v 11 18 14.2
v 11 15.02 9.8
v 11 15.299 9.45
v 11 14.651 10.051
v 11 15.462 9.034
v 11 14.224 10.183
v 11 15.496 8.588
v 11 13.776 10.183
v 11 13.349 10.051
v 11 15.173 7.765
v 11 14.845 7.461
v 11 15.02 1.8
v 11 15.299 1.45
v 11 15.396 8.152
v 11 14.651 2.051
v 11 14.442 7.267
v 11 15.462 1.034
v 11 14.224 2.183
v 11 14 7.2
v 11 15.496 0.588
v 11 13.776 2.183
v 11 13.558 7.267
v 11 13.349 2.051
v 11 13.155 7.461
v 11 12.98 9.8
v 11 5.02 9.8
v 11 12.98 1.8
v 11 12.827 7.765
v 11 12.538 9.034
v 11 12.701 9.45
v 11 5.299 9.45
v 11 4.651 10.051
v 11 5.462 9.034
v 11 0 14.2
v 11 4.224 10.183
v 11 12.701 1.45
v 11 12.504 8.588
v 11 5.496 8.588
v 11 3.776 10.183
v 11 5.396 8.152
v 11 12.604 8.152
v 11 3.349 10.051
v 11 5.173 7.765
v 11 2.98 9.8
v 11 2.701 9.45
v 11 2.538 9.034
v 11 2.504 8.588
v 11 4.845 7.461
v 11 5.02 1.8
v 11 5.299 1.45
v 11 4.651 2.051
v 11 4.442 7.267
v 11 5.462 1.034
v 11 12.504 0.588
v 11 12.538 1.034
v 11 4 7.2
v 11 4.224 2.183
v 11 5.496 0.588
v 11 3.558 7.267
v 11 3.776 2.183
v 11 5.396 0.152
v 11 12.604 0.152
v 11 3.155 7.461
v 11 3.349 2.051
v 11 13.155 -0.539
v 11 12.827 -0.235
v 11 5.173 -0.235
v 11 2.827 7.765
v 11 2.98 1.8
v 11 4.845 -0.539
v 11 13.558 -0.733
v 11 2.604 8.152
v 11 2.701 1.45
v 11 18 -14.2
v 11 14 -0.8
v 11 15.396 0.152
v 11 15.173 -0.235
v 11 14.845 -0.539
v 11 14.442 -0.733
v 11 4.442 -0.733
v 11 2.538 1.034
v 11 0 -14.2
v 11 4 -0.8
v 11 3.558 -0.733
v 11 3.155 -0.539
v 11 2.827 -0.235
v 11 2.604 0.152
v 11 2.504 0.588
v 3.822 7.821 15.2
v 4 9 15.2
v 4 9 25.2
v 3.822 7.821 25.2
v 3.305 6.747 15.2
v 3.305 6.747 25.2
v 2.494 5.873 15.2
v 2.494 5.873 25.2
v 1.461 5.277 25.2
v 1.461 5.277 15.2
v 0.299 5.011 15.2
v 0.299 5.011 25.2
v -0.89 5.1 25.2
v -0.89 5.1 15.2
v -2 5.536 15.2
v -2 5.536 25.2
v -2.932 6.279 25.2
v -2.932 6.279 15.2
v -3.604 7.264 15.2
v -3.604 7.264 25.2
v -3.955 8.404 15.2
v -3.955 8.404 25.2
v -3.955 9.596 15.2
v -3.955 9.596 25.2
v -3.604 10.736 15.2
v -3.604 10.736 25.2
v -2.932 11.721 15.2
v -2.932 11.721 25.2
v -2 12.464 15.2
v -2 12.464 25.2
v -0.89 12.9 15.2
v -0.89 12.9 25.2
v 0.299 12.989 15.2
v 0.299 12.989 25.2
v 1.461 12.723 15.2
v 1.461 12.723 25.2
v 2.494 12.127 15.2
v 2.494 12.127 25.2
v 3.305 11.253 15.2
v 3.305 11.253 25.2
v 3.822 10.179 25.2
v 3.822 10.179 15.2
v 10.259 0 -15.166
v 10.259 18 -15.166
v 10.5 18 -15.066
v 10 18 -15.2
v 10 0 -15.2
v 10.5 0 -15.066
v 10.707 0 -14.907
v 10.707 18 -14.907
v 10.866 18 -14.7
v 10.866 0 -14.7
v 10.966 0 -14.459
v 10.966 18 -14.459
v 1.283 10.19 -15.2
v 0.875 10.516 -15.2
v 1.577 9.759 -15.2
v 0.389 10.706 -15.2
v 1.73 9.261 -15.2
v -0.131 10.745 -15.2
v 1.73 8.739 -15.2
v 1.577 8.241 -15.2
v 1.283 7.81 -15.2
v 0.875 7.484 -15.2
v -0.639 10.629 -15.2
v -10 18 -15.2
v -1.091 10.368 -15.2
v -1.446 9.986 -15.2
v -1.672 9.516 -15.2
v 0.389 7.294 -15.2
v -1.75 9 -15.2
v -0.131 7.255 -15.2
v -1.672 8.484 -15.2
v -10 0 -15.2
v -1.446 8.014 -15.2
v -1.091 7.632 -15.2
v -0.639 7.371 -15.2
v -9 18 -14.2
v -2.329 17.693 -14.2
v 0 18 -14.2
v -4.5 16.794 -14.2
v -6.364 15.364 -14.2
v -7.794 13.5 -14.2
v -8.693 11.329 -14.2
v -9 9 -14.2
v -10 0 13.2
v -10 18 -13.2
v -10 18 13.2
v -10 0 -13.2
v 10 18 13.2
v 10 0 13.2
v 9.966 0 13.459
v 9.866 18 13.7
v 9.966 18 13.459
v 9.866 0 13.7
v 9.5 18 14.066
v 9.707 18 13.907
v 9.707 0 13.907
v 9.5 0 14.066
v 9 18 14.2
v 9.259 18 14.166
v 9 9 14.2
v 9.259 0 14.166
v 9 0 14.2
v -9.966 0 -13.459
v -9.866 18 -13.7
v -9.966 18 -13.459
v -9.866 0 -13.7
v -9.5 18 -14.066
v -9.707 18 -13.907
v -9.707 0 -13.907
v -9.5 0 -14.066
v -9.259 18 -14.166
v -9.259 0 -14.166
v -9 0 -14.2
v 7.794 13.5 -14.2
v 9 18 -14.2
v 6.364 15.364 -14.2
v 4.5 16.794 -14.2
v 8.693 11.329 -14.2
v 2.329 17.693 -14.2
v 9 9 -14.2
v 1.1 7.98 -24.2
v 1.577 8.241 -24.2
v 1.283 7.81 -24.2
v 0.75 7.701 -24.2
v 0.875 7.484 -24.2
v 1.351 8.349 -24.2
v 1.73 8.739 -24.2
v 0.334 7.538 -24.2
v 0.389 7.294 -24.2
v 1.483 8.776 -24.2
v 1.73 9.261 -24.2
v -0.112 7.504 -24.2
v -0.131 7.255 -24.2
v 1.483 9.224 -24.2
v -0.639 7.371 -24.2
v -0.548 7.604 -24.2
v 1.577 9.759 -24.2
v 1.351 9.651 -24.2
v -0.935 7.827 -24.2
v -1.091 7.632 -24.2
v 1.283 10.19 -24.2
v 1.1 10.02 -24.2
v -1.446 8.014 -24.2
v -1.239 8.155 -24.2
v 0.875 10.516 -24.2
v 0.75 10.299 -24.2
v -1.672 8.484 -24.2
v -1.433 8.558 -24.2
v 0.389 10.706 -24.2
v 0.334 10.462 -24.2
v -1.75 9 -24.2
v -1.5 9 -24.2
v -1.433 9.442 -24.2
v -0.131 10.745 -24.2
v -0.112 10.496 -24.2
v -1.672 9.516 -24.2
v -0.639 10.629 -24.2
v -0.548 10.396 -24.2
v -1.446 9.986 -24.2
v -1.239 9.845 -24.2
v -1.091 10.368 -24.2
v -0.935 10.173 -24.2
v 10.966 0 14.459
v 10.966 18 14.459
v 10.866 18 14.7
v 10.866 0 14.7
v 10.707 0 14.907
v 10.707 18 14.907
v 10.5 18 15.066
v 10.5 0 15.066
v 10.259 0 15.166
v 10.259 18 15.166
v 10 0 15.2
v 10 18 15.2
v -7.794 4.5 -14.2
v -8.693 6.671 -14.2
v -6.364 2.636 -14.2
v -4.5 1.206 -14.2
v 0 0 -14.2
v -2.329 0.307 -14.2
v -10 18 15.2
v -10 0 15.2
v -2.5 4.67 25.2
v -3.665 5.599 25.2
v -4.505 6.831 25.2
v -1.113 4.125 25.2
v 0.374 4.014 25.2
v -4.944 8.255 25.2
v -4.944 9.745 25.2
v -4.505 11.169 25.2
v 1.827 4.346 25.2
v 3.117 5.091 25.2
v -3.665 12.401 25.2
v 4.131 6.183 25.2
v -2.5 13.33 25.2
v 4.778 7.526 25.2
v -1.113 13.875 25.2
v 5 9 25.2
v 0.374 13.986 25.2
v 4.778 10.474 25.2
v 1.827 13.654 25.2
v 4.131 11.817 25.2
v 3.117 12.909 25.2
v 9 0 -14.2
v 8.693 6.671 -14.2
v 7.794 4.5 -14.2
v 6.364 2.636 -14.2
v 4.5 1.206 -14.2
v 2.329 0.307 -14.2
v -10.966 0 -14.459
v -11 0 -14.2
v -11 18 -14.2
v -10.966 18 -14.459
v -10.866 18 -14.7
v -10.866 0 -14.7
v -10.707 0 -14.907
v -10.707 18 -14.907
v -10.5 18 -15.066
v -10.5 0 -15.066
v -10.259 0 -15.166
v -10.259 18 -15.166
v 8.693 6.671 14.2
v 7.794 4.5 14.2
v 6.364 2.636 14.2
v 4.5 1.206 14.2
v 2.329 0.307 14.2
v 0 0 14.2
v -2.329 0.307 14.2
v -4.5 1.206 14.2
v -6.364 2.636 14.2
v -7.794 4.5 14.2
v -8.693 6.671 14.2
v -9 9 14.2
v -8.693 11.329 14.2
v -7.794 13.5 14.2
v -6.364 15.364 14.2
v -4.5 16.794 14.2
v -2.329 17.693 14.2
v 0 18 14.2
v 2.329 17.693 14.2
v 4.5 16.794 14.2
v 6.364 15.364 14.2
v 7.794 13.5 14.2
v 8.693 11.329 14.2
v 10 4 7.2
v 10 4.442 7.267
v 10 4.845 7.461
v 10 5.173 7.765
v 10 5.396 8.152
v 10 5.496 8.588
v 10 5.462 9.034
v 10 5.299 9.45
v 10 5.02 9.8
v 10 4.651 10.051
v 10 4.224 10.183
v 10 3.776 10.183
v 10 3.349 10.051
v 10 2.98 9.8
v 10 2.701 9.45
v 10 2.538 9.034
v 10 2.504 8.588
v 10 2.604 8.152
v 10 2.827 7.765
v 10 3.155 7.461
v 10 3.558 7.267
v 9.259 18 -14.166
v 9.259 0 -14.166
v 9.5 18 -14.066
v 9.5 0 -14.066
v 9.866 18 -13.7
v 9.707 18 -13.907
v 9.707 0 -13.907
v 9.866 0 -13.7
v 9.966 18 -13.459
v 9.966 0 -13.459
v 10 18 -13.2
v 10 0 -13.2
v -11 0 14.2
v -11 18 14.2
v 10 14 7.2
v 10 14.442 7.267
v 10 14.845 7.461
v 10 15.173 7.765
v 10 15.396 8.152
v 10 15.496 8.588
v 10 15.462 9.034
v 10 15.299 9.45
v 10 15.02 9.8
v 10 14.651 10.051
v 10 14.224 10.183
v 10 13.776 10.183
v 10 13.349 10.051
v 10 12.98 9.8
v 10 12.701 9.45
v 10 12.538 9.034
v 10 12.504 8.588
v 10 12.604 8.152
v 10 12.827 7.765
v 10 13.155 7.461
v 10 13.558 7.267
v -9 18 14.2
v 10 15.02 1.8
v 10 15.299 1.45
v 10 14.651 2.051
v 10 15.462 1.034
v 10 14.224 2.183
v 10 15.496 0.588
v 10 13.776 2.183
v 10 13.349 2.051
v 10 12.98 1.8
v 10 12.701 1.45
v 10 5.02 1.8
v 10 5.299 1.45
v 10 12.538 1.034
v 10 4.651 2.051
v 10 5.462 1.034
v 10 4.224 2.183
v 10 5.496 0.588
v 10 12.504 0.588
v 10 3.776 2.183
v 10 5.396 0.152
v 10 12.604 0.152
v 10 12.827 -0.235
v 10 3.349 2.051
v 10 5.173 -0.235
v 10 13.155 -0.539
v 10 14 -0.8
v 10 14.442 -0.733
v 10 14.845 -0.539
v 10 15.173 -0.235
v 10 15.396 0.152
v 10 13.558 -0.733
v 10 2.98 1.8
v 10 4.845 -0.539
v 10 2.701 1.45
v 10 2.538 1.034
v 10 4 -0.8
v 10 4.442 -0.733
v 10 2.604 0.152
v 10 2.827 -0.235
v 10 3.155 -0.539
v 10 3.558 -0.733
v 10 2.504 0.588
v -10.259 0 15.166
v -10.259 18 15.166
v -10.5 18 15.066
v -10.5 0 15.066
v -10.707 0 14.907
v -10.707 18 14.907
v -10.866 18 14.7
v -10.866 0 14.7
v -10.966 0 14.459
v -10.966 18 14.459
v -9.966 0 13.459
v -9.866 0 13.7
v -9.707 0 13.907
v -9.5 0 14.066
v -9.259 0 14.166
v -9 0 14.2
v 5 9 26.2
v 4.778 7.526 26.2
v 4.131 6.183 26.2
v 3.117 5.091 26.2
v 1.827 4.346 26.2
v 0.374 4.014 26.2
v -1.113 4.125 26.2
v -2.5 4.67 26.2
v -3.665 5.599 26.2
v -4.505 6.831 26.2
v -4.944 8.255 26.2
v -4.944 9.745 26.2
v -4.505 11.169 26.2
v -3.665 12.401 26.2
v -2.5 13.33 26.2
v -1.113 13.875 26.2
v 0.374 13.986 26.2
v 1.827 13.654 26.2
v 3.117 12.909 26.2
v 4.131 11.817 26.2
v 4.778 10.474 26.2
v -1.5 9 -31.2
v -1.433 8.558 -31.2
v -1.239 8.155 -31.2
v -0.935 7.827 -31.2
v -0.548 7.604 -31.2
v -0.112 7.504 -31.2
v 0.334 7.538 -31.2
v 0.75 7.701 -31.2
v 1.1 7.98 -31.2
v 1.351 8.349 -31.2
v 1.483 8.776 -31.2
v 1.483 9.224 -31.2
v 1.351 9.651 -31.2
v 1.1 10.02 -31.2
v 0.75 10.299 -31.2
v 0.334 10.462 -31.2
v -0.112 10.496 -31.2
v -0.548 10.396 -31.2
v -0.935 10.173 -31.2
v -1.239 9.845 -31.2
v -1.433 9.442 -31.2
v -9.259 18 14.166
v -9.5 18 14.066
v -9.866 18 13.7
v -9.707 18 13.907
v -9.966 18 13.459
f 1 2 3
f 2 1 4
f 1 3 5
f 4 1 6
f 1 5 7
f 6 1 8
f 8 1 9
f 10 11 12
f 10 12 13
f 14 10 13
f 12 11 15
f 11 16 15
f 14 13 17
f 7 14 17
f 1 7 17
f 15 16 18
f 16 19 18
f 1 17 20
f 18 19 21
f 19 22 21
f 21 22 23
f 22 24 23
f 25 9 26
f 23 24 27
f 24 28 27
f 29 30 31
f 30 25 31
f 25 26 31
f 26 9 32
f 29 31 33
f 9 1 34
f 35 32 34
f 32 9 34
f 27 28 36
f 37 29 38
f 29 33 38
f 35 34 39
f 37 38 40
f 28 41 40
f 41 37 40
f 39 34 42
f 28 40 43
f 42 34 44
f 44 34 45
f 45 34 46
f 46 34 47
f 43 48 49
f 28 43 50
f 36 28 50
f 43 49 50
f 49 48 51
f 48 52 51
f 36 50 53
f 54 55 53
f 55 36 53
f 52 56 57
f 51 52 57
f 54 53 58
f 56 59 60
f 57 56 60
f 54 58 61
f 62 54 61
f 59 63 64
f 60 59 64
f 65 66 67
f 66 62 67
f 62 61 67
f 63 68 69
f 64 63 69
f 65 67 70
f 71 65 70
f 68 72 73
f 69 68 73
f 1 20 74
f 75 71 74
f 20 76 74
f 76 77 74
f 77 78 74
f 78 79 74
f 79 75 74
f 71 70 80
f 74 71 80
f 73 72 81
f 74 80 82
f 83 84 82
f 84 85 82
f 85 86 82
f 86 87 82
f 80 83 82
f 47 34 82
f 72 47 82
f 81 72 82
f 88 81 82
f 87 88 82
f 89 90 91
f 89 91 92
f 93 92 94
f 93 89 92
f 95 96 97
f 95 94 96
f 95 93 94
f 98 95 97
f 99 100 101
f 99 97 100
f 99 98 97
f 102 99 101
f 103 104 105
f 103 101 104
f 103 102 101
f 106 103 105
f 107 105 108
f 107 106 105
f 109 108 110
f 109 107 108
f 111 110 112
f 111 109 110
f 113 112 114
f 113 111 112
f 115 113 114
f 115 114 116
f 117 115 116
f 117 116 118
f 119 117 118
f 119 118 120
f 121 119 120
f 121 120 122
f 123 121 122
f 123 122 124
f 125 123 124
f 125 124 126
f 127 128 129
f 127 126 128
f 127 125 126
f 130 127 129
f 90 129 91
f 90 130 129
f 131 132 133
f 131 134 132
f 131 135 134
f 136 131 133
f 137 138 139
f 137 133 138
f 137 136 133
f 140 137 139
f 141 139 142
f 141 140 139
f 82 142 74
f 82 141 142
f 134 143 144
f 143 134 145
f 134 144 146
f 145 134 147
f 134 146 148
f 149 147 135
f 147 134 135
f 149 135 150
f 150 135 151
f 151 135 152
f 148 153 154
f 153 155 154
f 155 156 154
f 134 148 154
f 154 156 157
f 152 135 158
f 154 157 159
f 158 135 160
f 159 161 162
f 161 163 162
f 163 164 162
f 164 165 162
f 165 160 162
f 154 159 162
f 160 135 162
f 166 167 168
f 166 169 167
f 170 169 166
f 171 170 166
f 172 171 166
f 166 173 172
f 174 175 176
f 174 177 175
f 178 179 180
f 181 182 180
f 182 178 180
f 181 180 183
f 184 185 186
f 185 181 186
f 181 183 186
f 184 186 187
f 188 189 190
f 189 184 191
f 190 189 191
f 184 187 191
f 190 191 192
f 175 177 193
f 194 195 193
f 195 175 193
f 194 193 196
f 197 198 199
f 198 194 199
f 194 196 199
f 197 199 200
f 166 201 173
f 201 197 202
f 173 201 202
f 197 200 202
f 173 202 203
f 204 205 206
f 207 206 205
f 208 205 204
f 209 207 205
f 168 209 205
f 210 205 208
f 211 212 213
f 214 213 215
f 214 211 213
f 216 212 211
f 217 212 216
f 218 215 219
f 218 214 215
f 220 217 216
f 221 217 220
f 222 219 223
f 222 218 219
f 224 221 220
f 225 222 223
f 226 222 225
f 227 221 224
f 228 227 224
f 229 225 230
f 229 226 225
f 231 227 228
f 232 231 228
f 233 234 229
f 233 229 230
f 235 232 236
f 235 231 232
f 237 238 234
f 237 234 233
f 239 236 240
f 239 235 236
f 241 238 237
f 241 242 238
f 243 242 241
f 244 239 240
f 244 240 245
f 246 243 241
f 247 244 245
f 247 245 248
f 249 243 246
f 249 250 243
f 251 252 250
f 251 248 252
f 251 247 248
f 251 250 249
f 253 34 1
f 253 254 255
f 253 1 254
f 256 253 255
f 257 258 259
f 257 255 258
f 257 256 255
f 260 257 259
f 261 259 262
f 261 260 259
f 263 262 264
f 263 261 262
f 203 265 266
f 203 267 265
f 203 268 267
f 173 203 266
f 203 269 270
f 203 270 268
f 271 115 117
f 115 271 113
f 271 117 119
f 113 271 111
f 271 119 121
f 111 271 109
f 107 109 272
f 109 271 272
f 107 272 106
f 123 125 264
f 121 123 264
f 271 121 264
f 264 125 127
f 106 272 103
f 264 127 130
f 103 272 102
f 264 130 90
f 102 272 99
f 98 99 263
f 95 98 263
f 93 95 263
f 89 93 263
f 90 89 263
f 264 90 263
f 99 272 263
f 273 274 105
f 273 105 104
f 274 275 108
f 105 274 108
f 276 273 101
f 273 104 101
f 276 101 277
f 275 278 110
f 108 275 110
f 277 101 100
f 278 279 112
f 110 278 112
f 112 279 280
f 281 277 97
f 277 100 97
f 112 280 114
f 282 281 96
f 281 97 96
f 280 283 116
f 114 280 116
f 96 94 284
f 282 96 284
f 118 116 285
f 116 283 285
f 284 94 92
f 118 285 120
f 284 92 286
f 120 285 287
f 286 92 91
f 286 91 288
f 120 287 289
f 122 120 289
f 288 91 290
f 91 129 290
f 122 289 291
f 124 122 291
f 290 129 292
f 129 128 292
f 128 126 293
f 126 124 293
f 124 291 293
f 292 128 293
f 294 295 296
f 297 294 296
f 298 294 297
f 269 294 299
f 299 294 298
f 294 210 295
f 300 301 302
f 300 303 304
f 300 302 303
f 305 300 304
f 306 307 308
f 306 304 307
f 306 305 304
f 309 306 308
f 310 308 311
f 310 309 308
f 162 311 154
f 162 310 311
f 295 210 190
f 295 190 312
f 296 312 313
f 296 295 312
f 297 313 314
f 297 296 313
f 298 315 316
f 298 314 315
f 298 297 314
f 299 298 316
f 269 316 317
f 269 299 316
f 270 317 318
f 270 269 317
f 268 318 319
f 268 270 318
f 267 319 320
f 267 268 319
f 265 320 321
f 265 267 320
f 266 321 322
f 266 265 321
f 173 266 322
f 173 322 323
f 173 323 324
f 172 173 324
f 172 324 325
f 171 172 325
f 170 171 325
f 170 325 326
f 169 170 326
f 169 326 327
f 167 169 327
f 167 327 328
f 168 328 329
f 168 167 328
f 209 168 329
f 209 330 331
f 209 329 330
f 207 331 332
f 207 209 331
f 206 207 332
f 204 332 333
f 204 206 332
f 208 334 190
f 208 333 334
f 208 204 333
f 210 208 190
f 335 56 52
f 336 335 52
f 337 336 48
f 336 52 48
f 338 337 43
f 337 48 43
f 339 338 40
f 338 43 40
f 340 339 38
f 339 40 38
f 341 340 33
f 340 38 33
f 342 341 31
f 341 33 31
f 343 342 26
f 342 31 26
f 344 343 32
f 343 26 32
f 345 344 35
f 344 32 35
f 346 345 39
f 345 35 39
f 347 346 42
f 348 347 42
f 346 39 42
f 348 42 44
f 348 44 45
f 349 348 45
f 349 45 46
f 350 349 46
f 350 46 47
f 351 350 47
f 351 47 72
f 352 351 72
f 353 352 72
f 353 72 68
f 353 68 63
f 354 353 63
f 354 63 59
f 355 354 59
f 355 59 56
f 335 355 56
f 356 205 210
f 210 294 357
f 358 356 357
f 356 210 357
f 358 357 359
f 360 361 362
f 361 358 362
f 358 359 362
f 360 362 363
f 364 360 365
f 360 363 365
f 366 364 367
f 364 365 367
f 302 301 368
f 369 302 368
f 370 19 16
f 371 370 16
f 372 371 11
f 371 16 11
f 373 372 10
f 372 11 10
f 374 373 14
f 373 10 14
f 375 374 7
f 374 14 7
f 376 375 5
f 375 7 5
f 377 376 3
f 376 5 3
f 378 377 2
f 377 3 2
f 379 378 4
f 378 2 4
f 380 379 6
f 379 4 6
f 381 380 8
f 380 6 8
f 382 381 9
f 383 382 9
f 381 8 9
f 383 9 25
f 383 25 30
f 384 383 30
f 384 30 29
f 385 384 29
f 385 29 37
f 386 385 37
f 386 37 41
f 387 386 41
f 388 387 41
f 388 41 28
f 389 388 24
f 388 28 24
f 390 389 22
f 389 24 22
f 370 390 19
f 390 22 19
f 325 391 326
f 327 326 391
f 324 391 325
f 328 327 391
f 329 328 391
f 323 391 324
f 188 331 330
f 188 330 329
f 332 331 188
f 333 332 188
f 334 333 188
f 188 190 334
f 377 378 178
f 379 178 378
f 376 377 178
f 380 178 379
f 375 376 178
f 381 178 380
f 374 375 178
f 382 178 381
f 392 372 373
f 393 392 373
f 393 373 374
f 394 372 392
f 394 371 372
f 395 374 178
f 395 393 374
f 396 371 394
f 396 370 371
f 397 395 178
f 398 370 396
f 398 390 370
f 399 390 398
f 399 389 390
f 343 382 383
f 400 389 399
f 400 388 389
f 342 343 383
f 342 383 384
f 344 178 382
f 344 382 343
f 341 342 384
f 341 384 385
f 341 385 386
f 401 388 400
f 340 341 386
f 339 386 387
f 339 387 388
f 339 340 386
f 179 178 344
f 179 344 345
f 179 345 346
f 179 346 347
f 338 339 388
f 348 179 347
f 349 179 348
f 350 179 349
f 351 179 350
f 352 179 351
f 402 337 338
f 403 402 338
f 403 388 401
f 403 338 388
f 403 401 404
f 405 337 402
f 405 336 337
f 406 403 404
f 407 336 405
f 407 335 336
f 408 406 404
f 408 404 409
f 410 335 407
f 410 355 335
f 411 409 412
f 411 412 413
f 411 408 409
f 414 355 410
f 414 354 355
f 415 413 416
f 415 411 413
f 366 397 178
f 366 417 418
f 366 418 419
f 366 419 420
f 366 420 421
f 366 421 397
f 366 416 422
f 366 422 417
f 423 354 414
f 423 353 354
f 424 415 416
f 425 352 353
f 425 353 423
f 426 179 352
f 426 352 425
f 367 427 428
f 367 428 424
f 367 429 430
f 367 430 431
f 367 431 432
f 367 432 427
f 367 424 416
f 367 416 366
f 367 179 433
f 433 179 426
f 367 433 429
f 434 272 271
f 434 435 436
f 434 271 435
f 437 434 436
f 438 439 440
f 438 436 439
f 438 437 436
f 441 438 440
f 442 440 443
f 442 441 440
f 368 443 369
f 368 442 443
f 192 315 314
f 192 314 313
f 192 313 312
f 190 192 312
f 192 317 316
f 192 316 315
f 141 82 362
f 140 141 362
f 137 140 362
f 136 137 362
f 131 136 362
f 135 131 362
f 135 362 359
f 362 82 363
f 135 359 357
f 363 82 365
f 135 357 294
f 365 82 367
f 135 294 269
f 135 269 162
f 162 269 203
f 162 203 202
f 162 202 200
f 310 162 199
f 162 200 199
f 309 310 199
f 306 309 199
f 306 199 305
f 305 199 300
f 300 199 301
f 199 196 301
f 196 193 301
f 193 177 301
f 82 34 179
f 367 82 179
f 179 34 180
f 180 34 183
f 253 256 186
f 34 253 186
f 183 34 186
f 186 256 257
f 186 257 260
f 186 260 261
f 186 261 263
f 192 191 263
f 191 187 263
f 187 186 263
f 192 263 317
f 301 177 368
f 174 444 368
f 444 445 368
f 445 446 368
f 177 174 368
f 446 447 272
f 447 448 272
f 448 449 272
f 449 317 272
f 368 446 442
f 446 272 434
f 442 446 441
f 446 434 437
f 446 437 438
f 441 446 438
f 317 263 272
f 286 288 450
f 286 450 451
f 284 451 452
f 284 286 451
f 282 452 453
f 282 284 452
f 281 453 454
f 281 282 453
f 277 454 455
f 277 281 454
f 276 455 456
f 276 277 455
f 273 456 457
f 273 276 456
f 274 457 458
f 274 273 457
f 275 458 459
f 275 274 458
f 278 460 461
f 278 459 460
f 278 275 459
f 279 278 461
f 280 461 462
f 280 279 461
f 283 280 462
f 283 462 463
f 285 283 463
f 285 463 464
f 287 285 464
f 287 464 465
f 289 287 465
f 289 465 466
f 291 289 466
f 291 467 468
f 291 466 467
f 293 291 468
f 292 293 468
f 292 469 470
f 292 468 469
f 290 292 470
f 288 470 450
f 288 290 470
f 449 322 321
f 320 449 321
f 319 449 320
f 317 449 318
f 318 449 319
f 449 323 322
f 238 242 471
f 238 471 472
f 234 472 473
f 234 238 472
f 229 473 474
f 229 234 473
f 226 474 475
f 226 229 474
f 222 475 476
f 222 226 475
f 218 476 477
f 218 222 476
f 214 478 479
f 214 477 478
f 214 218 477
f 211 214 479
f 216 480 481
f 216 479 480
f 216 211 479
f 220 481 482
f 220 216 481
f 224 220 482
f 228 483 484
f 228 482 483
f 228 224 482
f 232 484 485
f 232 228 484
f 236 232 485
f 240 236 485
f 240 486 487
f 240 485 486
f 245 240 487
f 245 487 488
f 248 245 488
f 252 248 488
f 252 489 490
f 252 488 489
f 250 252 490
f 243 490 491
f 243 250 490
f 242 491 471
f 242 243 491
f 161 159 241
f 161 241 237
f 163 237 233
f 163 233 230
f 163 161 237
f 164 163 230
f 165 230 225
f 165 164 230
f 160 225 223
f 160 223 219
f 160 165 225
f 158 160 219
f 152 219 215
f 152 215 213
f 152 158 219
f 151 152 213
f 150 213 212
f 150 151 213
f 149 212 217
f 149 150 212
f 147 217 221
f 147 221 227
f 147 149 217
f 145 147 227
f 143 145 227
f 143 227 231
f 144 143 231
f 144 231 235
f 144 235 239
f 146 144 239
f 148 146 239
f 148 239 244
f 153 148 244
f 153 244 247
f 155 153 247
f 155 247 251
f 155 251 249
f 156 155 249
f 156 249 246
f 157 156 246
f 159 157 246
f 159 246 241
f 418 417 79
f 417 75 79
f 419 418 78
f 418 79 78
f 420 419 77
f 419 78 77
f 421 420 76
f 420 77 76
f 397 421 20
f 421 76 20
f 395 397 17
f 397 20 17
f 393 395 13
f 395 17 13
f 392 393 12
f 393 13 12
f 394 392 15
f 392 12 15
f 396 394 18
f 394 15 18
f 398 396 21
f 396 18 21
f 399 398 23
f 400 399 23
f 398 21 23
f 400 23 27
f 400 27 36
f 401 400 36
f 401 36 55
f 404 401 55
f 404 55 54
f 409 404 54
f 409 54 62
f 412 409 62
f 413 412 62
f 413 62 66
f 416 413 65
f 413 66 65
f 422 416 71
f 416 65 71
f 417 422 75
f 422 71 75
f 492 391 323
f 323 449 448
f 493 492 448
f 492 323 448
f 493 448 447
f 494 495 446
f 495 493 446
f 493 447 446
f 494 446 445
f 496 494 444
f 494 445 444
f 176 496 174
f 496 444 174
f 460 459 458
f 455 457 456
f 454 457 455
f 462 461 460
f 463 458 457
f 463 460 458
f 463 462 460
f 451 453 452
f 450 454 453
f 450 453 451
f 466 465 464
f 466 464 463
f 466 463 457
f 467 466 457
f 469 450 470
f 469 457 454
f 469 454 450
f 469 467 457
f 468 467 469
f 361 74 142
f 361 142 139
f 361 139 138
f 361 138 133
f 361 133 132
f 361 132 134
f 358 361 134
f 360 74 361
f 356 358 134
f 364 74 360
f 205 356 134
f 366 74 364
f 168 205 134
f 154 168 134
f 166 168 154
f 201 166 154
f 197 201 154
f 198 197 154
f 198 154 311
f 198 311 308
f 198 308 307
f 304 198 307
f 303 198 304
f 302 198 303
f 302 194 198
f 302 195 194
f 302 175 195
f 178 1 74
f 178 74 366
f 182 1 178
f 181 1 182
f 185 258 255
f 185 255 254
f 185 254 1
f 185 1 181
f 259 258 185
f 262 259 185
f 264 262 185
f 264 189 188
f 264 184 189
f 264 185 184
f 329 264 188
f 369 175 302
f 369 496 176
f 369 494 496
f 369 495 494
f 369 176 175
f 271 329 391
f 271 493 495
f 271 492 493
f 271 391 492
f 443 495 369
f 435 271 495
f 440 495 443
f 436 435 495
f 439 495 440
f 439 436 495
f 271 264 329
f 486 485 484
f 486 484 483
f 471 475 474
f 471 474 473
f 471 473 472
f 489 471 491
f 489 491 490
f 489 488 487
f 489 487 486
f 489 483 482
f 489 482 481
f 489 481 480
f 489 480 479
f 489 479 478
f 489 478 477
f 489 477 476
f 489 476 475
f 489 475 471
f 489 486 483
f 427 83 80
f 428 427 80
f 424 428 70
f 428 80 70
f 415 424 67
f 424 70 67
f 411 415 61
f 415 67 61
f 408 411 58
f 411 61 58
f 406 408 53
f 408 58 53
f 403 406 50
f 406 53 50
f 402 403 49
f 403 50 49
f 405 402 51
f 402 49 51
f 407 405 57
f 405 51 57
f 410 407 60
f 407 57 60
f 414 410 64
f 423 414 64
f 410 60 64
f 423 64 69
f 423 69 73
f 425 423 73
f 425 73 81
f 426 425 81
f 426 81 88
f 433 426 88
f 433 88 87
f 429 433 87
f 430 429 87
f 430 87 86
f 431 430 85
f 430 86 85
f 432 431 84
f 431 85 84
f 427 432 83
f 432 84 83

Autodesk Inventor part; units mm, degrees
ref_plane "YZ Plane" through (0, 0, 0) normal (1, 0, 0) x (0, 1, 0)
ref_plane "XZ Plane" through (0, 0, 0) normal (0, 1, 0) x (-1, 0, 0)
ref_plane "XY Plane" through (0, 0, 0) normal (0, 0, 1) x (1, 0, 0)
sketch "Sketch1" plane through (0, 0, 0) normal (0, 1, 0) x (-1, 0, 0)
  line L0 (-11, 14.2) -> (-11, -14.2)
  line L1 (-10, -15.2) -> (10, -15.2)
  line L2 (11, -14.2) -> (11, 14.2)
  line L3 (10, 15.2) -> (-10, 15.2)
  line L4 (-11, 15.2) -> (11, -15.2) construction
  line L5 (-11, -15.2) -> (11, 15.2) construction
  line L6 (-10, 13.2) -> (-10, -13.2)
  line L7 (-9, -14.2) -> (9, -14.2)
  line L8 (10, -13.2) -> (10, 13.2)
  line L9 (9, 14.2) -> (-9, 14.2)
  line L10 (-10, 14.2) -> (10, -14.2) construction
  line L11 (-10, -14.2) -> (10, 14.2) construction
  arc A0 (11, 14.2) -> (10, 15.2) centre (10, 14.2) ccw
  arc A1 (10, 13.2) -> (9, 14.2) centre (9, 13.2) ccw
  arc A2 (9, -14.2) -> (10, -13.2) centre (9, -13.2) ccw
  arc A3 (10, -15.2) -> (11, -14.2) centre (10, -14.2) ccw
  arc A4 (-10, -13.2) -> (-9, -14.2) centre (-9, -13.2) ccw
  arc A5 (-11, -14.2) -> (-10, -15.2) centre (-10, -14.2) ccw
  arc A6 (-10, 15.2) -> (-11, 14.2) centre (-10, 14.2) ccw
  arc A7 (-9, 14.2) -> (-10, 13.2) centre (-9, 13.2) ccw
  point P0 (0, 0)
  dimension "d0" = 30.4
  dimension "d1" = 22
  dimension "d2" = 28.4
  dimension "d3" = 20
  dimension "d4" = 1
  dimension "d5" = 1
extrude "Extrusion1" add sketch "Sketch1" along normal blind 18
sketch "Sketch3" plane through (-9, 0, -14.2) normal (0, 0, 1) x (1, 0, 0)
  line L0 (9, 0) -> (9, 9)
  circle A0 centre (9, 9) radius 9
  dimension "d12" = 9
  dimension "d13" = 18
extrude "Extrusion3" add sketch "Sketch3" along normal up to surface (28.4 mm away)
sketch "Sketch4" plane through (-10, 0, 15.2) normal (0, 0, 1) x (1, 0, 0)
  circle A0 centre (10, 9) radius 4
  point P0 (10, 0)
  dimension "d16" = 8
extrude "Extrusion4" add sketch "Sketch4" along normal blind 10
sketch "Sketch5" plane through (0, 9, 25.2) normal (0, 0, 1) x (1, 0, 0)
  circle A0 centre (0, 0) radius 5
  point P0 (0, -9)
  dimension "d19" = 10
extrude "Extrusion5" add sketch "Sketch5" along normal blind 1
sketch "Sketch7" plane through (10, 0, -15.2) normal (0, 0, -1) x (-1, 0, 0)
  line L0 (10, 9) -> (10, 0)
  circle A0 centre (10, 9) radius 1.75
  dimension "d22" = 3.5
extrude "Extrusion6" add sketch "Sketch7" along normal blind 9
sketch "Sketch8" plane through (11, 0, 14.2) normal (1, 0, 0) x (0, 0, -1)
  line L0 (-1, 0) -> (-1, 18) projected
  line L1 (-1, 9) -> (5.5, 9)
  line L2 (5.5, 9) -> (5.5, 14)
  line L3 (5.5, 14) -> (5.5, 4)
  line L4 (5.5, 4) -> (13.5, 4)
  line L5 (13.5, 4) -> (13.5, 14)
  circle A0 centre (5.5, 14) radius 1.5
  circle A1 centre (13.5, 14) radius 1.5
  circle A2 centre (13.5, 4) radius 1.5
  circle A3 centre (5.5, 4) radius 1.5
  point P0 (14.2, 0)
  dimension "d25" = 6.5
  dimension "d26" = 5
  dimension "d27" = 10
  dimension "d28" = 8
  dimension "d29" = 3
  dimension "d30" = 3
  dimension "d31" = 3
  dimension "d32" = 3
extrude "Extrusion7" cut sketch "Sketch8" against normal blind 2
sketch "Sketch9" plane through (0, 9, -24.2) normal (0, 0, -1) x (-1, 0, 0)
  circle A0 centre (0, 0) radius 1.5
  point P0 (0, -9)
  dimension "d35" = 3
extrude "Extrusion8" add sketch "Sketch9" along normal blind 7
thread "Thread1" size "M3x0.5" class "6g" standard "ANSI Metric M Profile" full length
properties part number "Solenoid"
